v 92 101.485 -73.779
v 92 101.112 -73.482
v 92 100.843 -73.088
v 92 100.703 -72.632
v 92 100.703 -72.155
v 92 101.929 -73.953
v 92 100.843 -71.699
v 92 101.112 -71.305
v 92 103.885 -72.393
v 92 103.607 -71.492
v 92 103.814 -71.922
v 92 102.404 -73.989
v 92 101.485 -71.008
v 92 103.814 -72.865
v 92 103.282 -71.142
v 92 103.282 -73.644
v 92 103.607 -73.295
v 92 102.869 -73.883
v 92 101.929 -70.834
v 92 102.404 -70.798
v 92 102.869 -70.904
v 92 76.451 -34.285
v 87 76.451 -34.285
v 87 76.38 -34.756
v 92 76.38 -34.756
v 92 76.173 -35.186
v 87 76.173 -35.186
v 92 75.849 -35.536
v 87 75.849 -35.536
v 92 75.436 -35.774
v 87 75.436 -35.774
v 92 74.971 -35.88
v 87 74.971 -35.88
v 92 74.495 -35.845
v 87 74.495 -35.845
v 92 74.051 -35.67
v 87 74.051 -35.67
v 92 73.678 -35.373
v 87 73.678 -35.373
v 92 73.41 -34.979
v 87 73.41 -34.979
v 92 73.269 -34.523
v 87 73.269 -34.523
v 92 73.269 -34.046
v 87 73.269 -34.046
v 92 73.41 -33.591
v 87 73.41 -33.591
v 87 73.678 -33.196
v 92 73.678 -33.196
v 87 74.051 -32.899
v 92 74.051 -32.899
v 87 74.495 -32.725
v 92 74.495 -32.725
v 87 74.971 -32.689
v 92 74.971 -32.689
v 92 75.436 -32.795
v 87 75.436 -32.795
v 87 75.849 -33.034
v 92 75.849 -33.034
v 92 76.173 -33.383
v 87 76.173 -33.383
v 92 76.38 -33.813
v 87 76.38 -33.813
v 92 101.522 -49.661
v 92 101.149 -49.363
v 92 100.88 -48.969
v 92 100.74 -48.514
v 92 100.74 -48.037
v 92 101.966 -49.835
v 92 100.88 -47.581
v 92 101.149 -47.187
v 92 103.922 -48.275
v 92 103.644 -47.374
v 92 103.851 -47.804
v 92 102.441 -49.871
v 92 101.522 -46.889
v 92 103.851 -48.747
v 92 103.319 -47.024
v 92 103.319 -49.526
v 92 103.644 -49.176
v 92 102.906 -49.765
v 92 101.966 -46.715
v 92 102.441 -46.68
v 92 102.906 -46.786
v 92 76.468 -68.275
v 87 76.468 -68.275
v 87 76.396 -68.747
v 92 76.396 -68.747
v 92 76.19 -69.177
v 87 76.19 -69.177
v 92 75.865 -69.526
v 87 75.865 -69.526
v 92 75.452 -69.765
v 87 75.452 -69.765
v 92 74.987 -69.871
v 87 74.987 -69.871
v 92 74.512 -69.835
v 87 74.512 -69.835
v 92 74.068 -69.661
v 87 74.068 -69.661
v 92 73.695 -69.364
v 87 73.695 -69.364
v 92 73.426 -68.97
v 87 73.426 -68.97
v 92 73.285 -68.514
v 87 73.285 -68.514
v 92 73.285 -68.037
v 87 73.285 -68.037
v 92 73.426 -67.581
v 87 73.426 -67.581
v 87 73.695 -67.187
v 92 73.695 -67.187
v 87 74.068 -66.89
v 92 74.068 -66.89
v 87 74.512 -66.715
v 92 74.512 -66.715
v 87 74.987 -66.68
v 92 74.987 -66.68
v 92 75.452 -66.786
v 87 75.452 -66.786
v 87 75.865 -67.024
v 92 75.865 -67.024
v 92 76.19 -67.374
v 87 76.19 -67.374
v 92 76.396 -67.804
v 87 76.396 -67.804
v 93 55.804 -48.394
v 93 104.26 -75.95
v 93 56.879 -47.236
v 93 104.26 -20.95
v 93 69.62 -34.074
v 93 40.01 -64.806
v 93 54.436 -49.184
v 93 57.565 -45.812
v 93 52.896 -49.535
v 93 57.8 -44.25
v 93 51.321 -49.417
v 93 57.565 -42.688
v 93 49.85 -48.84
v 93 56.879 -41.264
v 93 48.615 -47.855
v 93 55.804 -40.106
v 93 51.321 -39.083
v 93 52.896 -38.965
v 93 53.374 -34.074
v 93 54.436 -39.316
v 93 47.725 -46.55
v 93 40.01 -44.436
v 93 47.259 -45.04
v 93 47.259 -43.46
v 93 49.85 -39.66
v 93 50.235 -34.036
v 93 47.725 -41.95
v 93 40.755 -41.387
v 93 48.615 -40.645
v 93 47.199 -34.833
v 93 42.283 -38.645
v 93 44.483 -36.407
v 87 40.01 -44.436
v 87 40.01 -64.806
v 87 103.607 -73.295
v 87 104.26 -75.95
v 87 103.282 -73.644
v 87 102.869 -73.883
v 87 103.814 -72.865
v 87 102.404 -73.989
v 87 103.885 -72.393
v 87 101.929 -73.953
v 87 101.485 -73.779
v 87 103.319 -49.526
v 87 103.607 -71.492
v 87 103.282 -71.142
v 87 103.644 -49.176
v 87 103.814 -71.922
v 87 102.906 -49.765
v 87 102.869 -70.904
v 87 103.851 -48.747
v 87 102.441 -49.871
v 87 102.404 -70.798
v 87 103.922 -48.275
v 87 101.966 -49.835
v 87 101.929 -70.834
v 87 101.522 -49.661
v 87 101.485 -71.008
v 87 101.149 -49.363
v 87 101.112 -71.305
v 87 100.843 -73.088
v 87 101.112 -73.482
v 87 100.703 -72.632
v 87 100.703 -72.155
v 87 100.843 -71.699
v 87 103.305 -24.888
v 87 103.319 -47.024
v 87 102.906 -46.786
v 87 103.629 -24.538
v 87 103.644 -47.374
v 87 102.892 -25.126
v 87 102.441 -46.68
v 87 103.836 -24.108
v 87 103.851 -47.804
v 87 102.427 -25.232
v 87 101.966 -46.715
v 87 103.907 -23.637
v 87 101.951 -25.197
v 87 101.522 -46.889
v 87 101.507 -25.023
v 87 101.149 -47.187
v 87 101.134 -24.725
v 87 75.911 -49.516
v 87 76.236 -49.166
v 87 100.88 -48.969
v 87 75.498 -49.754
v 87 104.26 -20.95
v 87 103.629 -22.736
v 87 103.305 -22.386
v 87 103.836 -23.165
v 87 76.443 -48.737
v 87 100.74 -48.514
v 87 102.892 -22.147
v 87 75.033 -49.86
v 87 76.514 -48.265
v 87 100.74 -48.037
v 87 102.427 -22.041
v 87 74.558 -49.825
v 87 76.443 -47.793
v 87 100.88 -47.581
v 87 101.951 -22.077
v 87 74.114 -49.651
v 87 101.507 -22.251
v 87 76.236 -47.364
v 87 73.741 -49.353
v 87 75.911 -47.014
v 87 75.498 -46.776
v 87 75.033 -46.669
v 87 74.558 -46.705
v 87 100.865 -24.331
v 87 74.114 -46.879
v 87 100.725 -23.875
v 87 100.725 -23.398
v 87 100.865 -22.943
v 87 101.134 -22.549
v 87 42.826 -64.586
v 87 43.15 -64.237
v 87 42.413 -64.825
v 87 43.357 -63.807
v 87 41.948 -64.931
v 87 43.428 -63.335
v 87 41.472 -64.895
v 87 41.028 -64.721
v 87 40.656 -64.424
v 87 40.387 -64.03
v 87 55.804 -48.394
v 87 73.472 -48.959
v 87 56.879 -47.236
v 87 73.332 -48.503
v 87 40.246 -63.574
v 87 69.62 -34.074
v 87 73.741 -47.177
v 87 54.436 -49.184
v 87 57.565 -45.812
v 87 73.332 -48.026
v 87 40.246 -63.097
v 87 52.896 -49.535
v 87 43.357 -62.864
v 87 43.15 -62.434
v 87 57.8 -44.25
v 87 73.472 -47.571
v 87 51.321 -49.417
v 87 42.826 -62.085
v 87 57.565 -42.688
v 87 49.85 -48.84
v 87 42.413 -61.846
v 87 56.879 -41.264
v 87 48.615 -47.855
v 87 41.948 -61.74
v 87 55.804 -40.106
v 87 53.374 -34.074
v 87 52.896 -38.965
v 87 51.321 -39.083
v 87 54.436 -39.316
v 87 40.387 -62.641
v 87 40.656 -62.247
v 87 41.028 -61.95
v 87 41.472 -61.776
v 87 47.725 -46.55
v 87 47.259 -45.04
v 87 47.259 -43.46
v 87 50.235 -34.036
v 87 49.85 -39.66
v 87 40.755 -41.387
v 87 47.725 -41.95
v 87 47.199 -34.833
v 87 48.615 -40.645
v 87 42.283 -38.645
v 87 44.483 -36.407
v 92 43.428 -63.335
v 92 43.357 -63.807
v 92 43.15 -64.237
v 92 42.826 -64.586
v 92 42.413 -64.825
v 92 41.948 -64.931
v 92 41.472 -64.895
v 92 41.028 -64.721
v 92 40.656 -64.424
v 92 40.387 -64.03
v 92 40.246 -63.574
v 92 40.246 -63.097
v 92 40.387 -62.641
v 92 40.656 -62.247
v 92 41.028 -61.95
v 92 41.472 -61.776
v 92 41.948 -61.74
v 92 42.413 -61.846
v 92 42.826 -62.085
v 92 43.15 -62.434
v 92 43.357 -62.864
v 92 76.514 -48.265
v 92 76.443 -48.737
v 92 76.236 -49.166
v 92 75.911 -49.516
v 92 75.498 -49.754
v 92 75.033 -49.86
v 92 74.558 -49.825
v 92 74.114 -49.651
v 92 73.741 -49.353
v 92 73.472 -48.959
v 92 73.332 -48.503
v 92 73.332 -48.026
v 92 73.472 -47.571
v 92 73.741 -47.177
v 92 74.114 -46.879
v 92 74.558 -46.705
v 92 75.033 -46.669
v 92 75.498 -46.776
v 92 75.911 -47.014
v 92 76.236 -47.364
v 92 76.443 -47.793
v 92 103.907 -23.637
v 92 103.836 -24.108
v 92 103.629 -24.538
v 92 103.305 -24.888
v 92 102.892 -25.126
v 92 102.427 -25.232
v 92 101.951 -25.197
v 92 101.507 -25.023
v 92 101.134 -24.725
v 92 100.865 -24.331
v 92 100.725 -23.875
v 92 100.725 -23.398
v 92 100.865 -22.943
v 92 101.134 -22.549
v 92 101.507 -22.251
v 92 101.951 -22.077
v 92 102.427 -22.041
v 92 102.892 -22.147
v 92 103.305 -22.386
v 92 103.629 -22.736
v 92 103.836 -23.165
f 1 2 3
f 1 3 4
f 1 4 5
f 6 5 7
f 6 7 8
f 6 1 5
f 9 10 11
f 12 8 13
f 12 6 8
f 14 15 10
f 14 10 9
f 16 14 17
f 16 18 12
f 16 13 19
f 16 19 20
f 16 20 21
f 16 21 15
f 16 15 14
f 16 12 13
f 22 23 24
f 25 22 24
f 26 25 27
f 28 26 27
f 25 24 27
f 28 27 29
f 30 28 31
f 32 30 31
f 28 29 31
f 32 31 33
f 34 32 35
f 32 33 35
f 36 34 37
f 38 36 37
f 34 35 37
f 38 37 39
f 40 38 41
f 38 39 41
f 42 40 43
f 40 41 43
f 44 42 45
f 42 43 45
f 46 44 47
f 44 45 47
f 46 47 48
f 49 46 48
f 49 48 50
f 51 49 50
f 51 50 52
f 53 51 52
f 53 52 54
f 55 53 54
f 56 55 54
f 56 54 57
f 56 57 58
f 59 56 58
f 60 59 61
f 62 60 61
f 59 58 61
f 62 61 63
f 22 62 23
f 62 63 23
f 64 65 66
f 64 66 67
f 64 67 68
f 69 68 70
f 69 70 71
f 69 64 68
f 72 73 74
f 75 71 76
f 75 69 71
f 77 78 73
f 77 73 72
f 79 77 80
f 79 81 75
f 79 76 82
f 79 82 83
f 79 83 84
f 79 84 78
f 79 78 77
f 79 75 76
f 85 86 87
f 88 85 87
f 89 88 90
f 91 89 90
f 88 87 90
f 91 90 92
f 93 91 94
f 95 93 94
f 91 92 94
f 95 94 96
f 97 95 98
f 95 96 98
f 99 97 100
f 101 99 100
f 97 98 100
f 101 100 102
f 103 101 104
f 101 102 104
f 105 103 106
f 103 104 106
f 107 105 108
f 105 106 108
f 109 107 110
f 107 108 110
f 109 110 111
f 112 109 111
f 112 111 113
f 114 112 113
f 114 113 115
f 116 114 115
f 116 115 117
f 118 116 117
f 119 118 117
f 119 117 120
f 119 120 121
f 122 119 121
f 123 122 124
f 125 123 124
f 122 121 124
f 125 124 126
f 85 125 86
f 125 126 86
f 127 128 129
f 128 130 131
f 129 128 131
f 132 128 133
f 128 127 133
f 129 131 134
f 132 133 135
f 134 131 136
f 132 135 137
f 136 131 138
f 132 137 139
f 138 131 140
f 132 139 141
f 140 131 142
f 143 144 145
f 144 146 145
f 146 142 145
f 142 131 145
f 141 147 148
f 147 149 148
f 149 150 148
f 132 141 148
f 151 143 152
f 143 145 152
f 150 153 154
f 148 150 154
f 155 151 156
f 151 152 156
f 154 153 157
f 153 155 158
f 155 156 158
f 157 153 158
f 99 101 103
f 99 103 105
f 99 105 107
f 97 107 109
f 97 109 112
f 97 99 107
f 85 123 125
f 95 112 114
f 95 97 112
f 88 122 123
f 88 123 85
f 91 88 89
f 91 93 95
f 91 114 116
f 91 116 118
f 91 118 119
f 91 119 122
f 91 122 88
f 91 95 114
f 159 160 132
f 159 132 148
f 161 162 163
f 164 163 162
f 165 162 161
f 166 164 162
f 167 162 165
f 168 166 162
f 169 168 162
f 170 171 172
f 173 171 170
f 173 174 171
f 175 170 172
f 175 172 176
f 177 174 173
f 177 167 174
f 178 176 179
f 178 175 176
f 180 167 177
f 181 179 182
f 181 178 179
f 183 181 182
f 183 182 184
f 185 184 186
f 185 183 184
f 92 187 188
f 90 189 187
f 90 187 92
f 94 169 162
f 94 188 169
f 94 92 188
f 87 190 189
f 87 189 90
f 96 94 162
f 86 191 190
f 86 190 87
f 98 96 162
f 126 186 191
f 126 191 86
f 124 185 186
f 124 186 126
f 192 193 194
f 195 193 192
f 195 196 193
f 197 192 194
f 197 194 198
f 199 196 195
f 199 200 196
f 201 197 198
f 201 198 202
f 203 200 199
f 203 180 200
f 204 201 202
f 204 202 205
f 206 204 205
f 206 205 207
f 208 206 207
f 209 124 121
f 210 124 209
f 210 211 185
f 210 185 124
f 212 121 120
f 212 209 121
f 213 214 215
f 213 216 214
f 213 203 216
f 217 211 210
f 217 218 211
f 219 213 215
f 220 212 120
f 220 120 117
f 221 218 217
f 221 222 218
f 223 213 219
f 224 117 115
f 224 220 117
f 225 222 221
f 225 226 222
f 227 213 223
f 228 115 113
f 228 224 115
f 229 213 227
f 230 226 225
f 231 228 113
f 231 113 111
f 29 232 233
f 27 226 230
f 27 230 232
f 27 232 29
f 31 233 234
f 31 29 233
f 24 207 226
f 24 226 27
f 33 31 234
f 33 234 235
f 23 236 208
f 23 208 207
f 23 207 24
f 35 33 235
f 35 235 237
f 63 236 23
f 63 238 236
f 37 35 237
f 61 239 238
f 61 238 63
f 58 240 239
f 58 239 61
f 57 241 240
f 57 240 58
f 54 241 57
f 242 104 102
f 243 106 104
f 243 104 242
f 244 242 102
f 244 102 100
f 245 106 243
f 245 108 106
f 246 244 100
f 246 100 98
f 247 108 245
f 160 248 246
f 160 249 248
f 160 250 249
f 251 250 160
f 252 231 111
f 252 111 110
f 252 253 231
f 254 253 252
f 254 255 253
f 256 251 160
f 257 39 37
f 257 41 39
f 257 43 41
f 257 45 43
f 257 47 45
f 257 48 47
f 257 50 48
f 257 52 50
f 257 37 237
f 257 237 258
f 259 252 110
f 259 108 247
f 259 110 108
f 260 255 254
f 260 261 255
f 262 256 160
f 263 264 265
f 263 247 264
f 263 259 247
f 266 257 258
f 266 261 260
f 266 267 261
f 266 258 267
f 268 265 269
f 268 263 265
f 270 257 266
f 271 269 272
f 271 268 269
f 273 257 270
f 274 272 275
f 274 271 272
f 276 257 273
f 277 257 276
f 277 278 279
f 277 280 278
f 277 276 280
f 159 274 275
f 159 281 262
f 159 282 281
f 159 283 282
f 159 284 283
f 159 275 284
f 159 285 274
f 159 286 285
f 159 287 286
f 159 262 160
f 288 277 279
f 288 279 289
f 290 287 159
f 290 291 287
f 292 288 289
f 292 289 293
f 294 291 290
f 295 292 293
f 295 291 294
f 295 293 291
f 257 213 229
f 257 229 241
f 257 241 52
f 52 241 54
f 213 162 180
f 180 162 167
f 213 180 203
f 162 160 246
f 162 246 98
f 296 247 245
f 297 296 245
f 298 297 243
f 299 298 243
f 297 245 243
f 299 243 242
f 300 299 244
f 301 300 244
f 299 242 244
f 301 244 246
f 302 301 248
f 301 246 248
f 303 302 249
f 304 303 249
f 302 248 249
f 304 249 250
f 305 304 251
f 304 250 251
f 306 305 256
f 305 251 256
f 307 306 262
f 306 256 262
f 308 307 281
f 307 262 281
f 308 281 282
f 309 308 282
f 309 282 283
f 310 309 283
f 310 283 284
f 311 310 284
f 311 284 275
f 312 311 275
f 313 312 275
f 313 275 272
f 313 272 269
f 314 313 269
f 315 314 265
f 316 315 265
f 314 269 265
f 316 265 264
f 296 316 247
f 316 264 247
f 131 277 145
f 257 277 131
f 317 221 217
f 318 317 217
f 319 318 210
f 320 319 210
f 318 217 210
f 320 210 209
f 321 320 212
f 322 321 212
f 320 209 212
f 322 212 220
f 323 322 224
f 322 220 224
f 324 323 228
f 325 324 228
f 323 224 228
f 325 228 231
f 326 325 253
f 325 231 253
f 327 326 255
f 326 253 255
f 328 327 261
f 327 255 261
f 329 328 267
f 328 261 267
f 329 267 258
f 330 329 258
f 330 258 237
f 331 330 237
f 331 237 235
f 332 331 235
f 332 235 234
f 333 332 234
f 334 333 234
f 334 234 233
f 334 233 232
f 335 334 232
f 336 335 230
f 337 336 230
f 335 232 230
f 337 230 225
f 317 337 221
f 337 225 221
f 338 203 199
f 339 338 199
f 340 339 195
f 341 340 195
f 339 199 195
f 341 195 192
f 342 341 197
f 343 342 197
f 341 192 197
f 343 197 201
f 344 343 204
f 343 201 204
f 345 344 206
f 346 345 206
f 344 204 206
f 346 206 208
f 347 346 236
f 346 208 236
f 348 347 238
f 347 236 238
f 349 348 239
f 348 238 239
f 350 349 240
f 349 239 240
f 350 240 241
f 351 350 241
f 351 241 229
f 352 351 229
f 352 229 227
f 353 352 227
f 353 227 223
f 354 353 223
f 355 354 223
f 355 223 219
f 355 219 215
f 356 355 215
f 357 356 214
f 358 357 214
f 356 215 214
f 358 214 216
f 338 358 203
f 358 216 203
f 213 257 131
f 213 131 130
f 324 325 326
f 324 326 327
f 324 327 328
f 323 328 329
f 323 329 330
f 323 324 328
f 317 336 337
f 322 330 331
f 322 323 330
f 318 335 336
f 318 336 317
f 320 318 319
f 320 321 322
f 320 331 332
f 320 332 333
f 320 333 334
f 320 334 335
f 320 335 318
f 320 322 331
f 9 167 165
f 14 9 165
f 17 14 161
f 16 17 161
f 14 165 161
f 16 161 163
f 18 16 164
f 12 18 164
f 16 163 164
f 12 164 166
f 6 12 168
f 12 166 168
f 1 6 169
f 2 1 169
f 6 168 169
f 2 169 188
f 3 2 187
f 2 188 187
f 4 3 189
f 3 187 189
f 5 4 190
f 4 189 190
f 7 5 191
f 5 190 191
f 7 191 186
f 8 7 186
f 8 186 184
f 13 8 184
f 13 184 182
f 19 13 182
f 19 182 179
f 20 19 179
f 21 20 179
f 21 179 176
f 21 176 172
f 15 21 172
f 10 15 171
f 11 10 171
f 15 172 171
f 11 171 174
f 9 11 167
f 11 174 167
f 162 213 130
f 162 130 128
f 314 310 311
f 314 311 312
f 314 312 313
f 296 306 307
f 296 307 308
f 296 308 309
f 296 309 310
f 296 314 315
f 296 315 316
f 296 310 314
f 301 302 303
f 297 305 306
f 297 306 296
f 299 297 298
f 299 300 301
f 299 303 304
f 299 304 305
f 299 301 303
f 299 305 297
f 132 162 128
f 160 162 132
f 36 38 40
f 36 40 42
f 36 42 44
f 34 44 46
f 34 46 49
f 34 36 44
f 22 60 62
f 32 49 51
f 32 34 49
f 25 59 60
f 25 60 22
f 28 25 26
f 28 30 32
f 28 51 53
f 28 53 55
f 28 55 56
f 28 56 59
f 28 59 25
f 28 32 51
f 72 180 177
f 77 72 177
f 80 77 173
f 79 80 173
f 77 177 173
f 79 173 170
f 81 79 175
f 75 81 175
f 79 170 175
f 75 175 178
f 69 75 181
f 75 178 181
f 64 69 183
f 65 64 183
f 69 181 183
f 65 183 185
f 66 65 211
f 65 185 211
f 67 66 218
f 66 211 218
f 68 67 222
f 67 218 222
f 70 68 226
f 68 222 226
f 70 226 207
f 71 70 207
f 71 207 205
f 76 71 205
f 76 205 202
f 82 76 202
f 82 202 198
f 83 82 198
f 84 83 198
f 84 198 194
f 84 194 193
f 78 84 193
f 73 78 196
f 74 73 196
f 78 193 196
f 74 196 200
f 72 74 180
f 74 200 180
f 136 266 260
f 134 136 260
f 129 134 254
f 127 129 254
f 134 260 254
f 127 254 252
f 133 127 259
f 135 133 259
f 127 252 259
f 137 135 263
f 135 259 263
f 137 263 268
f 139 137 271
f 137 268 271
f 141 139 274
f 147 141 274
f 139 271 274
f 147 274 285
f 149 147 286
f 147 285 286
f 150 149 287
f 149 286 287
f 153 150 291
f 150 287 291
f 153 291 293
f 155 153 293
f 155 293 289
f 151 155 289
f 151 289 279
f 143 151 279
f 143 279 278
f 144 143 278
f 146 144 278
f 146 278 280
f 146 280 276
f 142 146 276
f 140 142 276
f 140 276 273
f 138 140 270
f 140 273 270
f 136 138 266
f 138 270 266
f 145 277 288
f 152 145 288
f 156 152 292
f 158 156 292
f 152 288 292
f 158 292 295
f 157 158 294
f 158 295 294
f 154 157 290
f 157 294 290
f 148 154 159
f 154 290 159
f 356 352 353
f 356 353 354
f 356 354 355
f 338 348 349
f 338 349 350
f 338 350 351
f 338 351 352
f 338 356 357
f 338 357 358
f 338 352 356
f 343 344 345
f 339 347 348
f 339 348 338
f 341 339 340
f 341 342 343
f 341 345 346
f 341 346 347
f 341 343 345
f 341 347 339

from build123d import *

# Parameters (mm, degrees)
PAD012_DEPTH    = 6
SKETCH029_R     = 5.3
POCKET012_DEPTH = 6
SKETCH031_R     = 1.6
POCKET014_DEPTH = 5


with BuildPart() as part:
    # CopySketch029 → Pad012 (new body)
    with BuildSketch(Plane.YZ):
        with BuildLine():
            Line((69.62, -34.0739220052), (104.26, -20.95))
            Line((104.26, -20.95), (104.26, -75.95))
            Line((104.26, -75.95), (40.01, -64.8058991482))
            Line((40.01, -64.8058991482), (40.01, -44.4358991482))
            ThreePointArc((53.3737933734, -34.0739220052), (44.4834146169, -36.4066415985), (40.01, -44.4358991482))
            Line((53.3737933734, -34.0739220052), (69.62, -34.0739220052))
        make_face()
    extrude(amount=PAD012_DEPTH)

    # Sketch029 (on Face7 of Pad012) → Pocket012 (cut)
    with BuildSketch(Plane(origin=(0, 0, 0), x_dir=(0, 1, 0), z_dir=(-1, 0, 0))):
        with Locations((52.5, 44.25)):
            Circle(SKETCH029_R)
    extrude(amount=-POCKET012_DEPTH, mode=Mode.SUBTRACT)

    # Sketch031 (on Face4 of Pocket012) → Pocket014 (cut)
    with BuildSketch(Plane(origin=(0, 0, 0), x_dir=(0, 1, 0), z_dir=(-1, 0, 0))):
        with Locations((74.913826, 48.264923)):
            Circle(SKETCH031_R)
        with Locations((74.851181, 34.284763)):
            Circle(SKETCH031_R)
        with Locations((41.828423, 63.335484)):
            Circle(SKETCH031_R)
        with Locations((74.867561, 68.275307)):
            Circle(SKETCH031_R)
        with Locations((102.321861, 48.275112)):
            Circle(SKETCH031_R)
        with Locations((102.306999, 23.636881)):
            Circle(SKETCH031_R)
        with Locations((102.284668, 72.393417)):
            Circle(SKETCH031_R)
    extrude(amount=-POCKET014_DEPTH, mode=Mode.SUBTRACT)


with BuildPart() as part_1:
    # Body005 placement: moved
    add(part.part.moved(Location((87, 0, 0))))


solid = part_1.part
